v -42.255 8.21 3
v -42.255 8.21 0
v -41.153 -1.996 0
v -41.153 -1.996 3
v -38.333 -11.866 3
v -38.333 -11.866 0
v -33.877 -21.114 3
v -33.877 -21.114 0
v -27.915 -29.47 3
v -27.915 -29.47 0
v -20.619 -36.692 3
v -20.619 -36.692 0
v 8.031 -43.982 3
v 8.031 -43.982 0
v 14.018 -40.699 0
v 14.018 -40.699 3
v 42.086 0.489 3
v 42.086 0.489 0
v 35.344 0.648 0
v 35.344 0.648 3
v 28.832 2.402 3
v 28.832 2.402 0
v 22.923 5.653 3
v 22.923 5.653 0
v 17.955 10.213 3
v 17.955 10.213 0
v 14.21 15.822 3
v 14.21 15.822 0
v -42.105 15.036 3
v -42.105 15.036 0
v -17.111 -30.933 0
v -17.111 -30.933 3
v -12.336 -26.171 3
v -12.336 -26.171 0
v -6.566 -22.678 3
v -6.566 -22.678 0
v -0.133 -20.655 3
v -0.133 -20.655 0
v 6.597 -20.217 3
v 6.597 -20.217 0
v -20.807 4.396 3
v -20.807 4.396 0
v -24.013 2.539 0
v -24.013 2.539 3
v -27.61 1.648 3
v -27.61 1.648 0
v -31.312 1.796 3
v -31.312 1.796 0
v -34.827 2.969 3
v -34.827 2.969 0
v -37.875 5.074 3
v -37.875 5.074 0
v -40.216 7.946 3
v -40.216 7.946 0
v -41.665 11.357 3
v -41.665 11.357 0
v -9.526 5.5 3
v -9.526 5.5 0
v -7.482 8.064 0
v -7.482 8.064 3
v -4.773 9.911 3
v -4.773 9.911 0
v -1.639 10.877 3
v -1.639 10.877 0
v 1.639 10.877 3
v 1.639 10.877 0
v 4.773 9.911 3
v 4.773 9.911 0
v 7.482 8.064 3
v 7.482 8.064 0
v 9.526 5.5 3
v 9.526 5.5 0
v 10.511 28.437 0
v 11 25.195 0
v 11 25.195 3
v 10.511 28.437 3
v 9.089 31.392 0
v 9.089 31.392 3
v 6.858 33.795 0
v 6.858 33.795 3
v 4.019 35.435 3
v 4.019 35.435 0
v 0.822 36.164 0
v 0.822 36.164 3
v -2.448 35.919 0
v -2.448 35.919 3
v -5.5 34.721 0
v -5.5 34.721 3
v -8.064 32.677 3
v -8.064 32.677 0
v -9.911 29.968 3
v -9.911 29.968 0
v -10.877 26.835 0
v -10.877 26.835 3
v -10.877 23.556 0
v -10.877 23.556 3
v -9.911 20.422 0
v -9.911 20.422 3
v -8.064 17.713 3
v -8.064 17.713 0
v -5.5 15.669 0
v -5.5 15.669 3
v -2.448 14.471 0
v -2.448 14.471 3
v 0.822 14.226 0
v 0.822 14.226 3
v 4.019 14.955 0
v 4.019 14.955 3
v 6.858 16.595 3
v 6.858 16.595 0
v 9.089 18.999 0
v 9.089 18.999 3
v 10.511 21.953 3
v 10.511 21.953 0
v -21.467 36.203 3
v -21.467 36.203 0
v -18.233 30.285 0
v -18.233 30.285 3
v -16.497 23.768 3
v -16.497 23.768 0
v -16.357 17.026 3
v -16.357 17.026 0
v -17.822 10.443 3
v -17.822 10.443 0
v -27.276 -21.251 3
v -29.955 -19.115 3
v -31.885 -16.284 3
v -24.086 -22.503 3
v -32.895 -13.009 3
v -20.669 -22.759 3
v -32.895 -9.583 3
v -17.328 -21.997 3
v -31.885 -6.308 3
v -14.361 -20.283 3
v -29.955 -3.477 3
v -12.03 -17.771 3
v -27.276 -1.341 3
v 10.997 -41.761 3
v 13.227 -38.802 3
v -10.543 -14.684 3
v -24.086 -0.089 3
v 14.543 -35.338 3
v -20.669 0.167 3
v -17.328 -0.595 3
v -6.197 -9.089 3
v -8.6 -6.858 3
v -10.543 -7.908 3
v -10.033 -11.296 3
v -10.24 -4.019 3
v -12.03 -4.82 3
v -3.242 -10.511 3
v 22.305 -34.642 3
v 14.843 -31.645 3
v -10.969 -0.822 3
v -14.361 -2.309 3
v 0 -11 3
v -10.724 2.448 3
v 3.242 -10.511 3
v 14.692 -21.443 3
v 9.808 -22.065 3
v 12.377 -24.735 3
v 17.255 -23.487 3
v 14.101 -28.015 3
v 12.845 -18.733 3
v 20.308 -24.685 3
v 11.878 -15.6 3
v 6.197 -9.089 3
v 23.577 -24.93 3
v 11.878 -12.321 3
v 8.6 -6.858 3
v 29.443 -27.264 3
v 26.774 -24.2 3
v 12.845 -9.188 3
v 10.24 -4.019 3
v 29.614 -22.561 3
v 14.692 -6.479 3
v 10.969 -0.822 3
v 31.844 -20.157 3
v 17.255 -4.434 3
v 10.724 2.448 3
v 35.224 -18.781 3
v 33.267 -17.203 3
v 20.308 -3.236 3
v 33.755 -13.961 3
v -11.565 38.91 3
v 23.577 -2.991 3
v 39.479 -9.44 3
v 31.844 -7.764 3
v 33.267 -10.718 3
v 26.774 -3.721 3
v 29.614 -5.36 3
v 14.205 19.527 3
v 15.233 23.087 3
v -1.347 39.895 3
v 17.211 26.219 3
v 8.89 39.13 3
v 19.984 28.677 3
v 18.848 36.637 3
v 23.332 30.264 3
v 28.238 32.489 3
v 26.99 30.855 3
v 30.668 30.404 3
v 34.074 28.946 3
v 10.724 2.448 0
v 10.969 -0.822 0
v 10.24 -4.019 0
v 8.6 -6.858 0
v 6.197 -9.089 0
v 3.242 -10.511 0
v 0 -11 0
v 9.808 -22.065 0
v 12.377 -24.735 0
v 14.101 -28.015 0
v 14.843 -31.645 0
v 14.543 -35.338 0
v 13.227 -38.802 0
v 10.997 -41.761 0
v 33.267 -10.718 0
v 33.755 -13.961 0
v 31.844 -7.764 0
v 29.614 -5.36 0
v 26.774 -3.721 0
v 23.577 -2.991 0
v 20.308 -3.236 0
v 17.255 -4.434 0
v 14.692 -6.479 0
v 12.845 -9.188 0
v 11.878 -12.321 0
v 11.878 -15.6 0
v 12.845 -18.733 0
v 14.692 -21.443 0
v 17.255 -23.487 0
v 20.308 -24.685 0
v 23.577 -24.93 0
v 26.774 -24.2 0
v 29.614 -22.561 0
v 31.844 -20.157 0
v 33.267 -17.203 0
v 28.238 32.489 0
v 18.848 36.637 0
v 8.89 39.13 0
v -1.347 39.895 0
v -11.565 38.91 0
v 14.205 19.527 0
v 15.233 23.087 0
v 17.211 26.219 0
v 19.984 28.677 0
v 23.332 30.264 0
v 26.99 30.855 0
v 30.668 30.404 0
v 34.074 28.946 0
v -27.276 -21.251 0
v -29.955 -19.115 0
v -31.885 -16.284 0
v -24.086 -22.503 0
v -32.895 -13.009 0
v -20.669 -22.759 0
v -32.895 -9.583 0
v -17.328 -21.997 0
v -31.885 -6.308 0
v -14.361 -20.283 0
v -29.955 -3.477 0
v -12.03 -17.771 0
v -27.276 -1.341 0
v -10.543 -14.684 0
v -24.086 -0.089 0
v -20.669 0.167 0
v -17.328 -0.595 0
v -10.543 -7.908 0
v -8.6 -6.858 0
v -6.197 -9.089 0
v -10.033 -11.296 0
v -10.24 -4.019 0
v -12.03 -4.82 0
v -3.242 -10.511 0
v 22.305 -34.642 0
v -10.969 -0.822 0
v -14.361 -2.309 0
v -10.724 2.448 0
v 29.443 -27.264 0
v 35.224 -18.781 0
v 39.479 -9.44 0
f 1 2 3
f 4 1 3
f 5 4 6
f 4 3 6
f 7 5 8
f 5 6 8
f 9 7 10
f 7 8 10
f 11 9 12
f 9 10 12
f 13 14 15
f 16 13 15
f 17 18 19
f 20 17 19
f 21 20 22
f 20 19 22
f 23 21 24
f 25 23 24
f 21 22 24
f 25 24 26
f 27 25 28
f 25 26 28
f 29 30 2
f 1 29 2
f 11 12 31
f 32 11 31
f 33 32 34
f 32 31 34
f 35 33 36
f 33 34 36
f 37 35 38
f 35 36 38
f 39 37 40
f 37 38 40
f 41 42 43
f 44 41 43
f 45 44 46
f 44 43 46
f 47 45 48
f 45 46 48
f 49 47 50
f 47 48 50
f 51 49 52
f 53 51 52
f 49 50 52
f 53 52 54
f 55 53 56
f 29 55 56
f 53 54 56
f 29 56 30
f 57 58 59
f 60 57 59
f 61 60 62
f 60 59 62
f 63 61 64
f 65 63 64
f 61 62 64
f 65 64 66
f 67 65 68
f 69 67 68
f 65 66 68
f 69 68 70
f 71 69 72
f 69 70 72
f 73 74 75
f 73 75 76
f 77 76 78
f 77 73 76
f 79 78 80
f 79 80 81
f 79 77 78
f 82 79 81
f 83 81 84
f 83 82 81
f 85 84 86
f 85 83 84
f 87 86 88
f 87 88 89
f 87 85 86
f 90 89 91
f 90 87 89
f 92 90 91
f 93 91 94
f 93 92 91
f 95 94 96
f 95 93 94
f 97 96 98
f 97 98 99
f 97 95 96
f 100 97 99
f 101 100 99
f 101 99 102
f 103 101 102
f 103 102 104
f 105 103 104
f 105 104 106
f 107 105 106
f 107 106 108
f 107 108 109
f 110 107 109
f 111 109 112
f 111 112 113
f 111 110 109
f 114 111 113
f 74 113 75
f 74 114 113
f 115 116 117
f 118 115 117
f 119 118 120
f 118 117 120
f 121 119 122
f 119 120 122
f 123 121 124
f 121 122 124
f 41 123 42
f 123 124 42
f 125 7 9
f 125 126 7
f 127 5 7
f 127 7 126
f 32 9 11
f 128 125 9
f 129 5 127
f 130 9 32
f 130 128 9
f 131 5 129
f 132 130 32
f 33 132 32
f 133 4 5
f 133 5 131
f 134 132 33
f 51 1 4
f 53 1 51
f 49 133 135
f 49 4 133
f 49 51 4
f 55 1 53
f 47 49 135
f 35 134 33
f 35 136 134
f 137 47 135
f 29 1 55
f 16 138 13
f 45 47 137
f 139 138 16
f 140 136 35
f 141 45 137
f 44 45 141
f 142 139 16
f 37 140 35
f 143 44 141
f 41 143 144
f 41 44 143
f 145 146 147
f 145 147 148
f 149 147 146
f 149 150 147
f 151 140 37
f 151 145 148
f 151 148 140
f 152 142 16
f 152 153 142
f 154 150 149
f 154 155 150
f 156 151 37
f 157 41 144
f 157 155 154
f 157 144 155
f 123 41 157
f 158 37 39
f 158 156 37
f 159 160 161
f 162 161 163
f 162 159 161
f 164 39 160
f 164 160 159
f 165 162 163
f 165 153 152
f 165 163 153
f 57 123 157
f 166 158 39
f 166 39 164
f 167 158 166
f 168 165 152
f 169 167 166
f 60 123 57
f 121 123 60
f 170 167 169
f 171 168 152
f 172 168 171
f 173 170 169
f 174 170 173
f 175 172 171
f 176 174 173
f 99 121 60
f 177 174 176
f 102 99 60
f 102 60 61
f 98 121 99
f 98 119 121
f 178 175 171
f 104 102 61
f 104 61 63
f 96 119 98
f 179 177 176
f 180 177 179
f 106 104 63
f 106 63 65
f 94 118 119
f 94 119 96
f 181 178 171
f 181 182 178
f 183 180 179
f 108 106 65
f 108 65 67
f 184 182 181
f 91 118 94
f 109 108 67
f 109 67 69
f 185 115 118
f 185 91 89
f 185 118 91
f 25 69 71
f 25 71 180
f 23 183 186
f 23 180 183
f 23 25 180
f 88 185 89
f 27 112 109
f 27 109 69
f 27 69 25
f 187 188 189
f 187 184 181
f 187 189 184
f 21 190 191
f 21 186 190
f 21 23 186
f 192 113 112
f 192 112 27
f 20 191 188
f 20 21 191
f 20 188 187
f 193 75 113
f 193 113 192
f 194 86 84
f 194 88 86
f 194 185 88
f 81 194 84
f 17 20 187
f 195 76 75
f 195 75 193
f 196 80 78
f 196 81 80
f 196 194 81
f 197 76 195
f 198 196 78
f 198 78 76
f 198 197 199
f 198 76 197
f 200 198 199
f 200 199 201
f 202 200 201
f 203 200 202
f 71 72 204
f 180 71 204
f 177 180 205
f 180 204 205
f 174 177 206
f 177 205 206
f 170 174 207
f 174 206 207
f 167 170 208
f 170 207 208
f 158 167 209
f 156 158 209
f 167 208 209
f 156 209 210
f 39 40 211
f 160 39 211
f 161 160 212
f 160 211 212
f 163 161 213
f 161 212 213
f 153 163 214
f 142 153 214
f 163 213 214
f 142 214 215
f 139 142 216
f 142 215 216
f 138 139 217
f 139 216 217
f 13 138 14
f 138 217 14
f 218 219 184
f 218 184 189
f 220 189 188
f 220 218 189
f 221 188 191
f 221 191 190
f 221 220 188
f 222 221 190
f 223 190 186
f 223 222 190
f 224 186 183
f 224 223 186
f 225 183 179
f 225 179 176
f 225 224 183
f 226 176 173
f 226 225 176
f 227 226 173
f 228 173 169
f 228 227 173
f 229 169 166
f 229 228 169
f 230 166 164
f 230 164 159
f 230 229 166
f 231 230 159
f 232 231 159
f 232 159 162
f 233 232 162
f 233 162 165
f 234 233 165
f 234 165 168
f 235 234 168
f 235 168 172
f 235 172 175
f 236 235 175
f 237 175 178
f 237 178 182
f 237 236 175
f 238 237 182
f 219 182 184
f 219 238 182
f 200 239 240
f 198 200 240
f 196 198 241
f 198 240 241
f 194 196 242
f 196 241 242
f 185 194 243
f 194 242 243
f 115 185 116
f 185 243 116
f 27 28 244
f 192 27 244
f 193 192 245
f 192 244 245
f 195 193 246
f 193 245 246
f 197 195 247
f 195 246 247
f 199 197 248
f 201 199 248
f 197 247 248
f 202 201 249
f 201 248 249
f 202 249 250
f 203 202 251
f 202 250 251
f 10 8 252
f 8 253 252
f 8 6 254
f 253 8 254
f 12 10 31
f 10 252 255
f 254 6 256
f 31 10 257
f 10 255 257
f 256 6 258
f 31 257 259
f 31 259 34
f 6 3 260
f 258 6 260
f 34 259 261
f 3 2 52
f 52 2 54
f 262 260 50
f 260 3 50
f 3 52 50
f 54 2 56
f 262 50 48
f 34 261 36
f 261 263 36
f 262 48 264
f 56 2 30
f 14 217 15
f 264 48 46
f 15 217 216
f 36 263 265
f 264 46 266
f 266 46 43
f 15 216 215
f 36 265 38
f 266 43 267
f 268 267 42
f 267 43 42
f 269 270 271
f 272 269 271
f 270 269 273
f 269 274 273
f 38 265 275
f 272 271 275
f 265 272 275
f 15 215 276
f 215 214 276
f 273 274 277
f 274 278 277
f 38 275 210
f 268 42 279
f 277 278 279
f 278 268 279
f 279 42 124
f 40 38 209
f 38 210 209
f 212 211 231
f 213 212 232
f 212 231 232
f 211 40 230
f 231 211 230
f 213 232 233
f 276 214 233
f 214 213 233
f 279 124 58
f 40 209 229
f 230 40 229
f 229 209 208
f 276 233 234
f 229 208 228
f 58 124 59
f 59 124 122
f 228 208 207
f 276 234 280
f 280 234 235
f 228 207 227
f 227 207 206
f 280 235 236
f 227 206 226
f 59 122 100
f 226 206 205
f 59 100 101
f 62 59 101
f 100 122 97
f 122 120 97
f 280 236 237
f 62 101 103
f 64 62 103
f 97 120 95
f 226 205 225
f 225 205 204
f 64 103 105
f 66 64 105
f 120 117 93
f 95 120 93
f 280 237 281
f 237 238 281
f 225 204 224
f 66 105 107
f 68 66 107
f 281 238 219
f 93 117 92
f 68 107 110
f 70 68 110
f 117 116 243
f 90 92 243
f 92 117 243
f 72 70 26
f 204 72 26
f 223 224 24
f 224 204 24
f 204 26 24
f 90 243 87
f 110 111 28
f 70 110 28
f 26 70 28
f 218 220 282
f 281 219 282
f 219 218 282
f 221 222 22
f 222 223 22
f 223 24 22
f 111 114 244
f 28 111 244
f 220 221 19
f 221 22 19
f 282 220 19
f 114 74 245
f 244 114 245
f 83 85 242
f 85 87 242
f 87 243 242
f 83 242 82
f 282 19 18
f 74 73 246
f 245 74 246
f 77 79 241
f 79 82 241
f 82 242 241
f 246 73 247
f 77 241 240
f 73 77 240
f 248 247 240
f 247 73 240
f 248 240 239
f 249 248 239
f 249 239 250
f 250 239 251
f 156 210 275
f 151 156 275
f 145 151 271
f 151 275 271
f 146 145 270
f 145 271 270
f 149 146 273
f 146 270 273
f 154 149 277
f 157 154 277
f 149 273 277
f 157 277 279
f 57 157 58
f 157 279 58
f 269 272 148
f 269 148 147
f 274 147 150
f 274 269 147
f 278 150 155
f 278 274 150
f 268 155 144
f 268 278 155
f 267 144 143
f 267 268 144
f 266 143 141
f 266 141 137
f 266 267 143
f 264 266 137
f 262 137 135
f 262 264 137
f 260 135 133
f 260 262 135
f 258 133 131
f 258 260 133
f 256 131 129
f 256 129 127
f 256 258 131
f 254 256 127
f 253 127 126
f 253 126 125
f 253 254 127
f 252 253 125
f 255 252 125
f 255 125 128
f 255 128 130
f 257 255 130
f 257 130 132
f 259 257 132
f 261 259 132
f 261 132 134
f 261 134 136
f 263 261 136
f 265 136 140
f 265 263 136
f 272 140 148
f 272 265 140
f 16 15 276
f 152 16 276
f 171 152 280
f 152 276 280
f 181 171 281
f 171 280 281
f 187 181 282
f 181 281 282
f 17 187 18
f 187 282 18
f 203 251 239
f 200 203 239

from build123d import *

# Parameters (mm, degrees)
F0_R     = 11.495248
F0_R_2   = 11
F1_DEPTH = 3


with BuildPart() as f1:
    # F0 (on Top) → F1 (new body)
    with BuildSketch(Plane.XY):
        with BuildLine():
            Line((34.073839, 28.946415), (28.237904, 32.489196))
            ThreePointArc((28.237904, 32.489196), (3.787903, 39.731164), (-21.466842, 36.203202))
            ThreePointArc((-21.466842, 36.203202), (-16.224646, 20.401304), (-20.807121, 4.395633))
            ThreePointArc((-20.807121, 4.395633), (-34.826813, 2.968602), (-42.10525, 15.035603))
            Line((-42.10525, 15.035603), (-42.255421, 8.210144))
            ThreePointArc((-42.255421, 8.210144), (-36.302149, -16.585162), (-20.619472, -36.692431))
            ThreePointArc((-20.619472, -36.692431), (-9.555725, -24.251607), (6.596831, -20.217312))
            ThreePointArc((6.596831, -20.217312), (14.842522, -31.645205), (8.031411, -43.982018))
            Line((8.031411, -43.982018), (14.017518, -40.69934))
            ThreePointArc((14.017518, -40.69934), (32.514246, -23.146002), (42.086313, 0.48923))
            ThreePointArc((42.086313, 0.48923), (25.78037, 3.850303), (14.21029, 15.821679))
            ThreePointArc((14.21029, 15.821679), (19.984291, 28.676604), (34.073839, 28.946415))
        make_face()
        with Locations((-21.527926, -11.295904)):
            Circle(F0_R, mode=Mode.SUBTRACT)
        with Locations((22.755247, -13.960625)):
            Circle(F0_R_2, mode=Mode.SUBTRACT)
        with BuildLine():
            ThreePointArc((-9.526279, 5.5), (0, 11), (9.526279, 5.5))
            ThreePointArc((9.526279, 5.5), (9.526279, -5.5), (0, -11))
            ThreePointArc((0, -11), (-9.526279, -5.5), (-9.526279, 5.5))
        make_face(mode=Mode.SUBTRACT)
        with Locations((0, 25.195053)):
            Circle(F0_R_2, mode=Mode.SUBTRACT)
    extrude(amount=F1_DEPTH)


solid = f1.part
